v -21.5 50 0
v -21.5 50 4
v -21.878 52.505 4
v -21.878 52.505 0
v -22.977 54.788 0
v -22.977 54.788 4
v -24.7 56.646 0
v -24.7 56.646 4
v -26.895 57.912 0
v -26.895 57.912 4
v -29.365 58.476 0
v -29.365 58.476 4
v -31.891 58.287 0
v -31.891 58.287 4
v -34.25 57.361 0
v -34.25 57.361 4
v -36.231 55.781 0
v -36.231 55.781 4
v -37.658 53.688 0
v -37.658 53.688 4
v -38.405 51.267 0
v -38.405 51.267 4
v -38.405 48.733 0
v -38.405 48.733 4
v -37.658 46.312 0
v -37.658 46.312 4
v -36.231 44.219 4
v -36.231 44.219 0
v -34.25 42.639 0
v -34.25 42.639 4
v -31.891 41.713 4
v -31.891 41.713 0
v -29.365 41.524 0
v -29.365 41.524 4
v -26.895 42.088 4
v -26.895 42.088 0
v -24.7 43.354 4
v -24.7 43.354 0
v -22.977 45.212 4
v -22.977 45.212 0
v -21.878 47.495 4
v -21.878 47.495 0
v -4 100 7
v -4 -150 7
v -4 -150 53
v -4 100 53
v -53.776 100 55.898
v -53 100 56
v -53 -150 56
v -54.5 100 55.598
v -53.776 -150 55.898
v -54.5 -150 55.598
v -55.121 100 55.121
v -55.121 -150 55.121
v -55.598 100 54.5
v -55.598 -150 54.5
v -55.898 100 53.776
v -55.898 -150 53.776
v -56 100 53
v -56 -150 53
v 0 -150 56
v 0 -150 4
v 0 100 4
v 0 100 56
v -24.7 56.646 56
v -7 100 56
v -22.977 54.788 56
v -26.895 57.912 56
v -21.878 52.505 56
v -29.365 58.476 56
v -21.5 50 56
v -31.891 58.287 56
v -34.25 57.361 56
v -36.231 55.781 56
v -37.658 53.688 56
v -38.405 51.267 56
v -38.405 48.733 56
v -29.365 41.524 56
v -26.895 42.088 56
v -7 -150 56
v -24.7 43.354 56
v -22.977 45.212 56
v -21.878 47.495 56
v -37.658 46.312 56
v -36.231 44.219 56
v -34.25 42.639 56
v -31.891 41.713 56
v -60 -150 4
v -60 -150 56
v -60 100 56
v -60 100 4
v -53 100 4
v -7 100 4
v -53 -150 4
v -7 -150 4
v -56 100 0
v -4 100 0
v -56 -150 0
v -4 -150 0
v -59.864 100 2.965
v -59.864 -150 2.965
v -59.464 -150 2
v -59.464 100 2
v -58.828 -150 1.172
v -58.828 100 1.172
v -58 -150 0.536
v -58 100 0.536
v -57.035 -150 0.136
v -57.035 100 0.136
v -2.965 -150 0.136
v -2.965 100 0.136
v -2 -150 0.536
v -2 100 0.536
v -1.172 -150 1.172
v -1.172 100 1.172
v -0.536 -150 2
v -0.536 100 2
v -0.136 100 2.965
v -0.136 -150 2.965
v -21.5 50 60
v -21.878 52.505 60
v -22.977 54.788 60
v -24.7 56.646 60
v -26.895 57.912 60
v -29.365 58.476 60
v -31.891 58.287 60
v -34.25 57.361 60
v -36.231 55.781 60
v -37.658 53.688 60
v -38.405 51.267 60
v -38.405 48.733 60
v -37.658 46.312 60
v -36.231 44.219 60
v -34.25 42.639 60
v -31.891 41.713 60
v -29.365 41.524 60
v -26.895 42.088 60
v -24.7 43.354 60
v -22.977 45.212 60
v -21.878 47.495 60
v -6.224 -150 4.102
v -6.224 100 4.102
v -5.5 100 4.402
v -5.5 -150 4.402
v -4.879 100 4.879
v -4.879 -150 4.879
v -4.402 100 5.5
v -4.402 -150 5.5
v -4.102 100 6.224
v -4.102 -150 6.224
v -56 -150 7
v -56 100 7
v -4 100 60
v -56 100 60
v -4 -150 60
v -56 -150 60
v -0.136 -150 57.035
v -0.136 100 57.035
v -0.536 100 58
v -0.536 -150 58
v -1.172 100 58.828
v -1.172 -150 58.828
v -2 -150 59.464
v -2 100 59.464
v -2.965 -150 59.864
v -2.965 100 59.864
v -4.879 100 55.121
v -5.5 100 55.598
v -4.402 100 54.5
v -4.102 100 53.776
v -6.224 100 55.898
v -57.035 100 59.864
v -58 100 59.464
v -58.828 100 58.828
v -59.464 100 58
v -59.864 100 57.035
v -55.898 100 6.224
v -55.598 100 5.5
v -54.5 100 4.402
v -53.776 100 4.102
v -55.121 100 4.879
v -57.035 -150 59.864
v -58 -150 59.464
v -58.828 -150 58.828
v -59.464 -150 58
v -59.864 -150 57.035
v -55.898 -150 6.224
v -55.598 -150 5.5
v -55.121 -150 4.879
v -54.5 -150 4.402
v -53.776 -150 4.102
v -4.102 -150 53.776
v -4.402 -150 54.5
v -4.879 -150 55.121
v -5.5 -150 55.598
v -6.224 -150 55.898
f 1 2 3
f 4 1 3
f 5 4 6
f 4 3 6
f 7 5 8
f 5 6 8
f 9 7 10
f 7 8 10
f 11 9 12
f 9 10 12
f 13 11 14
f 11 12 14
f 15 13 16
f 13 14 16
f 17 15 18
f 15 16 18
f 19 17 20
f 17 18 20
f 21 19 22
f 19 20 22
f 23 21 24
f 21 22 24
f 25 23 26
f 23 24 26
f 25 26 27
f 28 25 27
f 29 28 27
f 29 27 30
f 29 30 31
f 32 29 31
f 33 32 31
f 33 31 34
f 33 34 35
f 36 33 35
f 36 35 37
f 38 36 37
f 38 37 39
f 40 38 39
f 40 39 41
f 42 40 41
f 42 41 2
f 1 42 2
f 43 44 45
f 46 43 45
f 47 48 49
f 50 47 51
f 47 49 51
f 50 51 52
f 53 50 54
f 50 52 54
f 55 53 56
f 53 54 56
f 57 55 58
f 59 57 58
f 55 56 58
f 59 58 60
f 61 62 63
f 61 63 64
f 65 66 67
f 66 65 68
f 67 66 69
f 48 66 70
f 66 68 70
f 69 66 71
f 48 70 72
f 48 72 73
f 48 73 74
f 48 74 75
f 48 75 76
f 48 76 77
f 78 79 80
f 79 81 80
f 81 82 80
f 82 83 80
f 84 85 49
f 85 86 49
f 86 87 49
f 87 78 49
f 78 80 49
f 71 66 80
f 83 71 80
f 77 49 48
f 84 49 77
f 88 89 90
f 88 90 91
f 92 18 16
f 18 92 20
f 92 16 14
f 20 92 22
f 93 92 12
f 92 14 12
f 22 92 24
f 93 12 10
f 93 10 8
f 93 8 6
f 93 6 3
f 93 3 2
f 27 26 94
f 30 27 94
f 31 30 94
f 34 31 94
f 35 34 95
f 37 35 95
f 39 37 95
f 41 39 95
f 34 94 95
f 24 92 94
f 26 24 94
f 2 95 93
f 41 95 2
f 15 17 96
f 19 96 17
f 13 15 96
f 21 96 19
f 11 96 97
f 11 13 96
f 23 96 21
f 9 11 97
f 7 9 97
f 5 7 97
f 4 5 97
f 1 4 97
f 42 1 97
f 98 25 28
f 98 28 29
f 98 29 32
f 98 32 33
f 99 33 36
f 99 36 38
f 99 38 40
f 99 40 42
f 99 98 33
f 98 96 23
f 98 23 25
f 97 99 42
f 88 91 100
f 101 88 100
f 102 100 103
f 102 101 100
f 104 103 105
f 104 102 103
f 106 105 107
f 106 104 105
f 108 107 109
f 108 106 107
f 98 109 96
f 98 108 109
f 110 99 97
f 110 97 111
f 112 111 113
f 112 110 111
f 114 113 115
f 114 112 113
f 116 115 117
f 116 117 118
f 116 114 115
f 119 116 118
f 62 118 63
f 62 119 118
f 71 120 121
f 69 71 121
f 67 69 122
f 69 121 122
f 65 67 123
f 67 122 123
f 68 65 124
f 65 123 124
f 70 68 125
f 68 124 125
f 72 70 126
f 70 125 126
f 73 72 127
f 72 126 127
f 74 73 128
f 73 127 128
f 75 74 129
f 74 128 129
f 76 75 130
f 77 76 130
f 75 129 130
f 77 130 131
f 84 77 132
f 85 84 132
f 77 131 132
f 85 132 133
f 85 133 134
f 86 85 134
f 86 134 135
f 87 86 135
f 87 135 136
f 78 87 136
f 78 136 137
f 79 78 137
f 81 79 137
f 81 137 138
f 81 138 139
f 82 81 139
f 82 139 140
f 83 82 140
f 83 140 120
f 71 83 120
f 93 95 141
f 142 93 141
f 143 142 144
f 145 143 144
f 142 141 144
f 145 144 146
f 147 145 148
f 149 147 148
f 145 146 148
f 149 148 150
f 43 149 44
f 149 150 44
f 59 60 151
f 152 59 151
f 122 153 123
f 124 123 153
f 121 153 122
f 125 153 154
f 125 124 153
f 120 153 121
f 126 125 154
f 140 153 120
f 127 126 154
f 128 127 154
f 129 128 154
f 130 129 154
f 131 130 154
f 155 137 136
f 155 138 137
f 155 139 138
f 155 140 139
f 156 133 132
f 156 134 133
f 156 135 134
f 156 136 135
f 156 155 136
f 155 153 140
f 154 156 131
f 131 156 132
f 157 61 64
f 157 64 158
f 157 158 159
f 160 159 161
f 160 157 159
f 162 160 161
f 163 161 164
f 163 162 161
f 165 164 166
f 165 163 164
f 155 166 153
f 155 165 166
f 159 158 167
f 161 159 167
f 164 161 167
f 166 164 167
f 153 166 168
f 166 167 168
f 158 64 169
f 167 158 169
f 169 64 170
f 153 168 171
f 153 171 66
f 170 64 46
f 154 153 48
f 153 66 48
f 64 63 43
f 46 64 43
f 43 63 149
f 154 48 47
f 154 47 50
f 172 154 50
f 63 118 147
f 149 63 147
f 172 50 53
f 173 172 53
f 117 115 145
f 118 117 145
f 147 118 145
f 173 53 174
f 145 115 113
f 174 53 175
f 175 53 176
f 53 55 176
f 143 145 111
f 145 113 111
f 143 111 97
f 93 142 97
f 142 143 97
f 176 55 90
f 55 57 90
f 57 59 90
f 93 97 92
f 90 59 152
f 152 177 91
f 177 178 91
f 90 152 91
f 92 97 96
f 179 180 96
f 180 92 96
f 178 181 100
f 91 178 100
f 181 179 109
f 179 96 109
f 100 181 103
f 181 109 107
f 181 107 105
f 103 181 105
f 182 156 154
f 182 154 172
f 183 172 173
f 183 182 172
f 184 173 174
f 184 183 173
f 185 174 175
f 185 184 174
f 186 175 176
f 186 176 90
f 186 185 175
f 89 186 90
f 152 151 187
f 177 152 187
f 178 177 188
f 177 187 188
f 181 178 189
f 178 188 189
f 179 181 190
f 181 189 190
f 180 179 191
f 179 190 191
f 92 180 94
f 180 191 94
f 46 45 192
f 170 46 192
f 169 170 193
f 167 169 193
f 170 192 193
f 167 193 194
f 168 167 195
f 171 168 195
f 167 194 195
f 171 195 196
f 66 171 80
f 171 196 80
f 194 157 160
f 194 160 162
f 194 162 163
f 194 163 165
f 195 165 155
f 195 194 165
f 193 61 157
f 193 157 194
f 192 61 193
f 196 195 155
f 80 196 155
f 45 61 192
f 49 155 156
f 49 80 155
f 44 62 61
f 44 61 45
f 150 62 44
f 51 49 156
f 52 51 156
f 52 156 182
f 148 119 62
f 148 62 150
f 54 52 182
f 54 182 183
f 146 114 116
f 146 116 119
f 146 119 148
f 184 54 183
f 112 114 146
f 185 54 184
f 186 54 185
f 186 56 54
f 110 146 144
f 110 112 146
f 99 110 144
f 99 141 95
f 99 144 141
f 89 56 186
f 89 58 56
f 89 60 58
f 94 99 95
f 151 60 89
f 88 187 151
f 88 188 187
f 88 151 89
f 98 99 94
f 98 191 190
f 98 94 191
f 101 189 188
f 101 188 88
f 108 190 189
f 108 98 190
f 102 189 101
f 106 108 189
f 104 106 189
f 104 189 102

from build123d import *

# Parameters (mm, degrees)
EXTRUDE_1_DEPTH      = 100
EXTRUDE_1_DEPTH_BACK = 150
SKETCH_2_R           = 8.5
CUT_EXTRUDE_1_DEPTH  = 173.336879396


with BuildPart() as part:
    # Эскиз1 → Бобышка-Вытянуть1 (new, two sides: drawn at the far end of the back side and taken through both)
    with BuildSketch(Plane(origin=(0, 0, 0), x_dir=(1, 0, 0), z_dir=(0, 1, 0)).offset(-EXTRUDE_1_DEPTH_BACK)):
        with BuildLine():
            Line((-56, 0), (-4, 0))
            ThreePointArc((-4, 0), (-1.171572875, -1.171572875), (0, -4))
            Line((0, -4), (0, -56))
            ThreePointArc((0, -56), (-1.171572875, -58.828427125), (-4, -60))
            Line((-4, -60), (-56, -60))
            ThreePointArc((-56, -60), (-58.828427125, -58.828427125), (-60, -56))
            Line((-60, -56), (-60, -4))
            ThreePointArc((-60, -4), (-58.828427125, -1.171572875), (-56, 0))
        make_face()
        with BuildLine():
            Line((-53, -4), (-7, -4))
            ThreePointArc((-7, -4), (-4.878679656, -4.878679656), (-4, -7))
            Line((-4, -7), (-4, -53))
            ThreePointArc((-4, -53), (-4.878679656, -55.121320344), (-7, -56))
            Line((-7, -56), (-53, -56))
            ThreePointArc((-53, -56), (-55.121320344, -55.121320344), (-56, -53))
            Line((-56, -53), (-56, -7))
            ThreePointArc((-56, -7), (-55.121320344, -4.878679656), (-53, -4))
        make_face(mode=Mode.SUBTRACT)
    extrude(amount=EXTRUDE_1_DEPTH + EXTRUDE_1_DEPTH_BACK)

    # Эскиз2 → Вырез-Вытянуть1 (cut, through all)
    with BuildSketch(Plane.XY.offset(60)):
        with Locations((-30, 50)):
            Circle(SKETCH_2_R)
    extrude(amount=-CUT_EXTRUDE_1_DEPTH, mode=Mode.SUBTRACT)


solid = part.part
